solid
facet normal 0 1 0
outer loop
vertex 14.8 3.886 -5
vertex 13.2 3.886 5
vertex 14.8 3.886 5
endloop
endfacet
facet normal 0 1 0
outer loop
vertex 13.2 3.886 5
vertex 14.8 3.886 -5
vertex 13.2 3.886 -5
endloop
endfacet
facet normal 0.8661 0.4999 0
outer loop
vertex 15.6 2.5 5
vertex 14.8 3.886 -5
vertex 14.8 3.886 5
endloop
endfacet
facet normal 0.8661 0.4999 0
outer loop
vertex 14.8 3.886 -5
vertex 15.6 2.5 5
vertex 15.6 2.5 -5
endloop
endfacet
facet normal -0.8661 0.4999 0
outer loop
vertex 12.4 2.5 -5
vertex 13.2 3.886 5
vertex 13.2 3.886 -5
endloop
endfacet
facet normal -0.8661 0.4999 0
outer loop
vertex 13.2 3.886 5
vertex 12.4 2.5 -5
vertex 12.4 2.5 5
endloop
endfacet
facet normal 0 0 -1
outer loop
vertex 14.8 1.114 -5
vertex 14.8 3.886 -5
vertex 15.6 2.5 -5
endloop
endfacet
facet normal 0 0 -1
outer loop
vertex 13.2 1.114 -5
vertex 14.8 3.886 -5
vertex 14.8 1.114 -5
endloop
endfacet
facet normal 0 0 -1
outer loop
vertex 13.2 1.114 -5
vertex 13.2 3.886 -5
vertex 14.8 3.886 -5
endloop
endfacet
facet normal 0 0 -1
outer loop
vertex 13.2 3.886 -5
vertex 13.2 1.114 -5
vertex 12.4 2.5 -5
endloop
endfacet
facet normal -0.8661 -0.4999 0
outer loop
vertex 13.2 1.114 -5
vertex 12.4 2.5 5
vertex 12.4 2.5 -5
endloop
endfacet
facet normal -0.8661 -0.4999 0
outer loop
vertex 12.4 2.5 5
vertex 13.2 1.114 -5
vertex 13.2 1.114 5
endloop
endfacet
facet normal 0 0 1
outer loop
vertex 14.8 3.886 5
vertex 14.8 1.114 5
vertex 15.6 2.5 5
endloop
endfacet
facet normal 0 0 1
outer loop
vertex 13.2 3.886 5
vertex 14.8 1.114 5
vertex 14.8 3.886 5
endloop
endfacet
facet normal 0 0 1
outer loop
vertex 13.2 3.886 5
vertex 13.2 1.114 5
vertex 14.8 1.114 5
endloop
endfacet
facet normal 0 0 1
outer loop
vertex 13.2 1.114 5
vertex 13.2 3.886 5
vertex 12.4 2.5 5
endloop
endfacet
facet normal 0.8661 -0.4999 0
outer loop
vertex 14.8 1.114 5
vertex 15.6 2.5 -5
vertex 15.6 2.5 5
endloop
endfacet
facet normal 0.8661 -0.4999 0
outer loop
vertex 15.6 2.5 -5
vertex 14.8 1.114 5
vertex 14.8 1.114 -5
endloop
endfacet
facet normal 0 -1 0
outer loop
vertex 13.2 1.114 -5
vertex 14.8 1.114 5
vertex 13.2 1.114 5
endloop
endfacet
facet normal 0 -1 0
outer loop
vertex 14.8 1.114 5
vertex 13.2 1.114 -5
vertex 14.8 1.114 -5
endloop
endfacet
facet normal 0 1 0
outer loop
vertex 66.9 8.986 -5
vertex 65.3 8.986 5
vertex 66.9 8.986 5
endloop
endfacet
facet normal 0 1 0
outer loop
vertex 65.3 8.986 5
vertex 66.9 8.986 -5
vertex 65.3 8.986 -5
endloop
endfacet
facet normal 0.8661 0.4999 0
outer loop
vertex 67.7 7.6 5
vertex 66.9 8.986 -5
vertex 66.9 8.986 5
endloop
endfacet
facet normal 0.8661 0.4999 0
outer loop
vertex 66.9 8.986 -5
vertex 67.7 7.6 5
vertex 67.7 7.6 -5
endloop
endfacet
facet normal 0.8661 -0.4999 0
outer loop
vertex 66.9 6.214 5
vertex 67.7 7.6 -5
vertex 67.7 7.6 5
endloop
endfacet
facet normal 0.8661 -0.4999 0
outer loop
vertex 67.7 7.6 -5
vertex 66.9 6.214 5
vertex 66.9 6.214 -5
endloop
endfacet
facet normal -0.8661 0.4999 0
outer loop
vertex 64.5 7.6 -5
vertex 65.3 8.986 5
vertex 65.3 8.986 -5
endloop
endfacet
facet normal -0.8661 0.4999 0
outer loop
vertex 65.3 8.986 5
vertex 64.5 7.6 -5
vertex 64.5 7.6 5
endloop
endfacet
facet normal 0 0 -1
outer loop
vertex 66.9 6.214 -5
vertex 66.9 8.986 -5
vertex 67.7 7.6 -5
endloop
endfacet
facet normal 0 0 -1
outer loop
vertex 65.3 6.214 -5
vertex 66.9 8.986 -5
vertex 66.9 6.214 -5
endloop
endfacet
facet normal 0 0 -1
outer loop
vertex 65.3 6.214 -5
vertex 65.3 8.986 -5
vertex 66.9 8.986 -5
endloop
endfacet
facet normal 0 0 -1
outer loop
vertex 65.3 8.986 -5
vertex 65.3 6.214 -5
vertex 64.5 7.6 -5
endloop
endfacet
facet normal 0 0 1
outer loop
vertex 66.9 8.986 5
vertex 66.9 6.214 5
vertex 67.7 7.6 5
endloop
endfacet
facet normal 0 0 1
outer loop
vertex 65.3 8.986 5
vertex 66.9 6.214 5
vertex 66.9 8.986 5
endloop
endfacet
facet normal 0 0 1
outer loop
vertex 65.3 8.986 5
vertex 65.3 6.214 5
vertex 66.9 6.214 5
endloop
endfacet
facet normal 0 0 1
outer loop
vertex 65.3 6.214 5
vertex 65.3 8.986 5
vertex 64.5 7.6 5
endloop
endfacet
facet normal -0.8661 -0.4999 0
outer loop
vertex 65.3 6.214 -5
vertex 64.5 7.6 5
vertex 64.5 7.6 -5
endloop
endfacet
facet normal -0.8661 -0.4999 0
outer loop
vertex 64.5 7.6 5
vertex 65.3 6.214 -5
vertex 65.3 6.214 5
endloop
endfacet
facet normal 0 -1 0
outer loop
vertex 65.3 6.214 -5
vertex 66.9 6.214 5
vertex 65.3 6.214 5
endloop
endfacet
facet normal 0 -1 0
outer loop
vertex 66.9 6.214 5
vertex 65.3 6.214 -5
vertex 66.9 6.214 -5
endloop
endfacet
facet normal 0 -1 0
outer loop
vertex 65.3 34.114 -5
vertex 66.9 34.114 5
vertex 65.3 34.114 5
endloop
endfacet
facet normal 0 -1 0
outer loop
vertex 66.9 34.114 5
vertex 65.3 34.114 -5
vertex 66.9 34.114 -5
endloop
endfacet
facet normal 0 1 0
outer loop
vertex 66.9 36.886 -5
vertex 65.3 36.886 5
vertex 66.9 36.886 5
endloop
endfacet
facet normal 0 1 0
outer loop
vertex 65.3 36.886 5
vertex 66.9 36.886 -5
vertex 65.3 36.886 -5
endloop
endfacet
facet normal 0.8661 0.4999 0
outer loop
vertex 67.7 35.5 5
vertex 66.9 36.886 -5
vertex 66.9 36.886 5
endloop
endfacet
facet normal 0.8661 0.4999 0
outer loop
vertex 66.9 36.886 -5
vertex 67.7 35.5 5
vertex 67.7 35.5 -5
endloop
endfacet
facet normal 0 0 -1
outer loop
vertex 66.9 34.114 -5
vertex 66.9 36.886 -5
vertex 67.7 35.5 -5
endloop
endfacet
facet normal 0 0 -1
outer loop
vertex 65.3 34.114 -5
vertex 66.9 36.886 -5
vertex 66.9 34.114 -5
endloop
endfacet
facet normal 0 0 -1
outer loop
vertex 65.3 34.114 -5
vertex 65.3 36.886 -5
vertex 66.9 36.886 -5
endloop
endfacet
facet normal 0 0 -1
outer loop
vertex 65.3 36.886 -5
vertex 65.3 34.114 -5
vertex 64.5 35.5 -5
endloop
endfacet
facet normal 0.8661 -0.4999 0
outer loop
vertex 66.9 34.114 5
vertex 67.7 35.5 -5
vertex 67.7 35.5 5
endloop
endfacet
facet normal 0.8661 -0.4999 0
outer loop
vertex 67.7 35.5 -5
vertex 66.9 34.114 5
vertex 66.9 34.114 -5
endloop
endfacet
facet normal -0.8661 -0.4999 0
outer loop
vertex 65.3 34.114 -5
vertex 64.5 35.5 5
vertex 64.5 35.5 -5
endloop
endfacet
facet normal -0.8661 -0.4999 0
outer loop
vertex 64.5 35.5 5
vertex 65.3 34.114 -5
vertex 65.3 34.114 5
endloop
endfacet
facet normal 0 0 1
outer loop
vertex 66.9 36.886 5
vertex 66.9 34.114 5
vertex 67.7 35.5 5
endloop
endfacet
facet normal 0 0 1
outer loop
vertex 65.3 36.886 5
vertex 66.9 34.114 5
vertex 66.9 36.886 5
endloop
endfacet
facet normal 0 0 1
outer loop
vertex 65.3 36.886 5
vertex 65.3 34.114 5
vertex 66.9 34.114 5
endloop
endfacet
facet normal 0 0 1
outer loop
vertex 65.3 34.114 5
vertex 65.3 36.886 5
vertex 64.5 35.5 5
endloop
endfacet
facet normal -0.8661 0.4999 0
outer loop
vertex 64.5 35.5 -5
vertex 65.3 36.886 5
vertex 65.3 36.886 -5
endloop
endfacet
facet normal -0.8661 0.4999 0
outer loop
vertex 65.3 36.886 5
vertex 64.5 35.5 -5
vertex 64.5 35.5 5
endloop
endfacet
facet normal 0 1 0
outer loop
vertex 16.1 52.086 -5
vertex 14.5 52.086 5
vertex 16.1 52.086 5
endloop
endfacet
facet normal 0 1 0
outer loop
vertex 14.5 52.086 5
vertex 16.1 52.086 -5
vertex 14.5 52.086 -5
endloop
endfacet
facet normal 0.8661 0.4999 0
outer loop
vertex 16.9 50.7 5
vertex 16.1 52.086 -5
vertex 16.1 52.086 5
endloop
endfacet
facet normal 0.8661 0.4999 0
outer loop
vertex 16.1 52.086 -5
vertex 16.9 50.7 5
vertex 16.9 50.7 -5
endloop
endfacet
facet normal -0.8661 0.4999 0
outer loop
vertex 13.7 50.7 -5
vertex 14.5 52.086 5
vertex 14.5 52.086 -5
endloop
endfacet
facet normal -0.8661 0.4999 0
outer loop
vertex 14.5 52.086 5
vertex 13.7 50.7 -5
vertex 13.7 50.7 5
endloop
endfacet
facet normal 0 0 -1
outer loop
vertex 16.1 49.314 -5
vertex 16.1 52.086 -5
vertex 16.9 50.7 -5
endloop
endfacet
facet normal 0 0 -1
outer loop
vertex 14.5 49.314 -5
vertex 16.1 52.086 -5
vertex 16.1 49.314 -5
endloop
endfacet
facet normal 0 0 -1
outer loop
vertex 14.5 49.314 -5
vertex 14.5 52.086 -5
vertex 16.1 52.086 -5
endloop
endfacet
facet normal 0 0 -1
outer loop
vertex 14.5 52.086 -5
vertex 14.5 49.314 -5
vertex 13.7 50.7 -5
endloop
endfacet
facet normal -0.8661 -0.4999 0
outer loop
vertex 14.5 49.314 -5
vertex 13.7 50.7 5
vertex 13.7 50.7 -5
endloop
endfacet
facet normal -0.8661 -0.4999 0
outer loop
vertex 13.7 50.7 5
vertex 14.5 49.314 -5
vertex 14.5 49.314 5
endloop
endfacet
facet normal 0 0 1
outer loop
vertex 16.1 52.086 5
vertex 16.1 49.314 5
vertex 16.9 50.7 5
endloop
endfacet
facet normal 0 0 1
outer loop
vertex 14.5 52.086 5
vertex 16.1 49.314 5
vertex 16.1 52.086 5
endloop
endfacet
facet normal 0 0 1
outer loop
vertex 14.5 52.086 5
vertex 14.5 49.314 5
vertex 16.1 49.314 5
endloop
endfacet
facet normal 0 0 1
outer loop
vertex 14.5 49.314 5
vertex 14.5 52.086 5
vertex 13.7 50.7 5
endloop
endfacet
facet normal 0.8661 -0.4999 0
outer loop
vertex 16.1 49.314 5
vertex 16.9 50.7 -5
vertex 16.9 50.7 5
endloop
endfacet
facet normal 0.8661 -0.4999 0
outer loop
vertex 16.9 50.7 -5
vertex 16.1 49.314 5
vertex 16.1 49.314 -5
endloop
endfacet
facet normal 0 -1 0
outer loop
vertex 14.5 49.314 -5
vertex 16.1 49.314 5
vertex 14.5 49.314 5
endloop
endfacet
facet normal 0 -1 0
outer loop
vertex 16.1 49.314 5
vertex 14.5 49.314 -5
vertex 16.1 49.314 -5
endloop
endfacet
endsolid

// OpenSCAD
/*

Arduino holes

Olivier Boesch © 2021


*/

arduino_uno_holes = [
                        [14, 2.5],
                        [14+1.3+50.8, 2.5+5.1],
                        [14+1.3+50.8, 2.5+5.1+27.9],
                        [14+1.3, 2.5+5.1+27.9+15.2]
                    ];
                    
module arduino_uno_place_on_holes(){
    for(h=arduino_uno_holes){
        translate(h) children(0);
    }
}

arduino_uno_place_on_holes() cylinder(h=10, d=3.2, center=true);
